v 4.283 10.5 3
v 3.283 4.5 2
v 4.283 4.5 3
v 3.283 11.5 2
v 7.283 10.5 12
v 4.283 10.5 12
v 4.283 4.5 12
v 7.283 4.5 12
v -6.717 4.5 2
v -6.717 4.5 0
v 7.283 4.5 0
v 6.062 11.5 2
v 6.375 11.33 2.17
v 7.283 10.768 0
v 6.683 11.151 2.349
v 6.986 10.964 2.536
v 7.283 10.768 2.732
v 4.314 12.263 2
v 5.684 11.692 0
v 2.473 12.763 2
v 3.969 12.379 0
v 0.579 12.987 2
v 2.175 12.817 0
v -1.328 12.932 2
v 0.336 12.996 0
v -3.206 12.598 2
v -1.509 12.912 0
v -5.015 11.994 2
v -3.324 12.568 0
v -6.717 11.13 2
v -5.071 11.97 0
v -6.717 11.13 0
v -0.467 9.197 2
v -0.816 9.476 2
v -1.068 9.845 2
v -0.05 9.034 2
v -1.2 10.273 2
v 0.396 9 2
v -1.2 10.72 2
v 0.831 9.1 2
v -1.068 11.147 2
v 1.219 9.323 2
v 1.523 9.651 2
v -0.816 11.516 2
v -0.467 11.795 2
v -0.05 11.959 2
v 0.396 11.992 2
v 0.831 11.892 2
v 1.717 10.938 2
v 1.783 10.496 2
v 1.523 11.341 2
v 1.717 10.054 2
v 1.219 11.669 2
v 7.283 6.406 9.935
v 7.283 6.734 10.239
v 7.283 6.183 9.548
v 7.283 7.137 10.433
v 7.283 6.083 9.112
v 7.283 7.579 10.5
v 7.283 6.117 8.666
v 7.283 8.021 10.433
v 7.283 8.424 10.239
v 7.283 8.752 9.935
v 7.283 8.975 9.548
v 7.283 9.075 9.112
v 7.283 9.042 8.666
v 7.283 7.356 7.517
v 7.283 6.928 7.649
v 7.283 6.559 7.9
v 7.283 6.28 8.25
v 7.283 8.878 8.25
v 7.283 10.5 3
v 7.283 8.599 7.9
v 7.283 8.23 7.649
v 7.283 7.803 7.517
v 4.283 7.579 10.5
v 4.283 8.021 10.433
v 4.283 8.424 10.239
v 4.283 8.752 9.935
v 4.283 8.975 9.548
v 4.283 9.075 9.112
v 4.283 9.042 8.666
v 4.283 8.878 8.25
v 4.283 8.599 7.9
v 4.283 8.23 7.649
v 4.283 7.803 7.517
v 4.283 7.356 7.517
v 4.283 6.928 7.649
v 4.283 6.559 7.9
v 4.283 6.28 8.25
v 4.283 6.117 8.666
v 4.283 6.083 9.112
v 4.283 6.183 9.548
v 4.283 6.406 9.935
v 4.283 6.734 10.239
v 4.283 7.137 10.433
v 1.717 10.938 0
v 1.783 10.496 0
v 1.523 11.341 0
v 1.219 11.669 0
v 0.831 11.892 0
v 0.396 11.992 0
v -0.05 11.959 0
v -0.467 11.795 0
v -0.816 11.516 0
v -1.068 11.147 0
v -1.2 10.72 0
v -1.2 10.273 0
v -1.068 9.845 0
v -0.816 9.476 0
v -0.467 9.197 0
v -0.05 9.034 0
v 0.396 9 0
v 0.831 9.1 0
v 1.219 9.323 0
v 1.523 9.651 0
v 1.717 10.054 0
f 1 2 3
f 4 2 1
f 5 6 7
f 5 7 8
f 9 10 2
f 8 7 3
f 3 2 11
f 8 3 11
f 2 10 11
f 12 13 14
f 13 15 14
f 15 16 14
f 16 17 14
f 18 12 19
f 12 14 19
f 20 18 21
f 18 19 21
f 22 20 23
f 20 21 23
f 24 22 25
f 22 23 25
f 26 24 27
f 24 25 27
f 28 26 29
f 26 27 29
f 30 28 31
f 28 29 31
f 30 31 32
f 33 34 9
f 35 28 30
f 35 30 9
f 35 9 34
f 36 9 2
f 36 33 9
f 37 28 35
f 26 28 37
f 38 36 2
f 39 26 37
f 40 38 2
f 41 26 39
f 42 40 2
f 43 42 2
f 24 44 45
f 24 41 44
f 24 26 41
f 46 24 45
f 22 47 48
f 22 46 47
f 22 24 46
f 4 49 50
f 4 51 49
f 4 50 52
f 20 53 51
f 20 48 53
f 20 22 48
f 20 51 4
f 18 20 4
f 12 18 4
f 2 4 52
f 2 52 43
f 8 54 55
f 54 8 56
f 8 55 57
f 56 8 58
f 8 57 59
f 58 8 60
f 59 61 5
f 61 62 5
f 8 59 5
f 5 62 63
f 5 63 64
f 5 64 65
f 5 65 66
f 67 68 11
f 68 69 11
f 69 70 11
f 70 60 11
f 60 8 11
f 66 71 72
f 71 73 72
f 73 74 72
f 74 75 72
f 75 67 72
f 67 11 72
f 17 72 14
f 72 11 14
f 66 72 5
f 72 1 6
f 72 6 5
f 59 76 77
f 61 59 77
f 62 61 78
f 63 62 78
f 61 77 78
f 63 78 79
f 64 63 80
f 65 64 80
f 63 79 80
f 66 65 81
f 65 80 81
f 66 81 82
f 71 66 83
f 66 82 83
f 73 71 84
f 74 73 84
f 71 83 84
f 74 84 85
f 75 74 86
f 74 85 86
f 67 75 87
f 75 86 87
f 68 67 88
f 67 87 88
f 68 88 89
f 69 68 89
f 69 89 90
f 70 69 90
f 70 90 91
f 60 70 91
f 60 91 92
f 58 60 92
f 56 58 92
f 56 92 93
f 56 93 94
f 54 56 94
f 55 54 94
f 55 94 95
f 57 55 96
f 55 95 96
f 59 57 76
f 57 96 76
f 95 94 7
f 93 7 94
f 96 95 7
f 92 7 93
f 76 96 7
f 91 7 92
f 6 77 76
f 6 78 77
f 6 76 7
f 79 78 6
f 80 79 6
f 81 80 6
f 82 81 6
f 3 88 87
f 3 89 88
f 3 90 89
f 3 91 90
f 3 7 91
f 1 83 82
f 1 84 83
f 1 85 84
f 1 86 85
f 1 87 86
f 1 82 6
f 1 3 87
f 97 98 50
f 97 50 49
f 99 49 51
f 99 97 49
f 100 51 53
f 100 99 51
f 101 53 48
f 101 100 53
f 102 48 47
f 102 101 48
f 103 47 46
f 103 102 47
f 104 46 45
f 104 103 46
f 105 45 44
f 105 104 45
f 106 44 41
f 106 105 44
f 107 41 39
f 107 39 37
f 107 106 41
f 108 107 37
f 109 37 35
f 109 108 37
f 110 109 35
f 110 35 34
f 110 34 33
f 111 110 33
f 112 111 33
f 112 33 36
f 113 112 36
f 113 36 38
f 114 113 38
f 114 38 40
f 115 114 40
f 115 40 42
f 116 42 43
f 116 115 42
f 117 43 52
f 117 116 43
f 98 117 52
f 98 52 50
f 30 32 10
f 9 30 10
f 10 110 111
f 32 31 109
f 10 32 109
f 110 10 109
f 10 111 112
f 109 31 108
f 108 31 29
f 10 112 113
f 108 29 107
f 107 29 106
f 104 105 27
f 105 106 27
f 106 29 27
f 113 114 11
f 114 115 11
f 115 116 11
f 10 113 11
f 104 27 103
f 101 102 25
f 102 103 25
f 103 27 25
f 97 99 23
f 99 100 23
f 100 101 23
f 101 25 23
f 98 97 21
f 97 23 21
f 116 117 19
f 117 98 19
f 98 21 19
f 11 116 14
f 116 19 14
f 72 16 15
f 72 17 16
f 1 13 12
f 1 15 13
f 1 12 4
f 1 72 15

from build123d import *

# Parameters (mm, degrees)
SZKIC1_R                    = 1.5
DODANIE_WYCI_GNI_CIE1_DEPTH = 2
SZKIC2_W                    = 3
SZKIC2_H                    = 6
DODANIE_WYCI_GNI_CIE2_DEPTH = 10
SZKIC3_R                    = 1.5
WYTNIJ_WYCI_GNI_CIE1_DEPTH  = 3
SFAZOWANIE1_SIZE            = 1
SFAZOWANIE2_SIZE            = 1


with BuildPart() as part:
    # Szkic1 → Dodanie-wyciągnięcie1 (new body)
    with BuildSketch(Plane.XY):
        with BuildLine():
            Line((-6.716548808, 4.5), (7.283451192, 4.5))
            Line((7.283451192, 4.5), (7.283451192, 10.768070335))
            ThreePointArc((7.283451192, 10.768070335), (0.336426694, 12.995646082), (-6.716548808, 11.130497388))
            Line((-6.716548808, 11.130497388), (-6.716548808, 4.5))
        make_face()
        with Locations((0.283451192, 10.49617337)):
            Circle(SZKIC1_R, mode=Mode.SUBTRACT)
    extrude(amount=DODANIE_WYCI_GNI_CIE1_DEPTH)

    # Szkic2 → Dodanie-wyciągnięcie2 (add)
    with BuildSketch(Plane.XY.offset(2)):
        with Locations((5.783451192, 7.5)):
            Rectangle(SZKIC2_W, SZKIC2_H)
    extrude(amount=DODANIE_WYCI_GNI_CIE2_DEPTH)

    # Szkic3 → Wytnij-wyciągnięcie1 (cut)
    with BuildSketch(Plane.ZY.offset(-4.283451192)):
        with Locations((9, 7.579153313)):
            Circle(SZKIC3_R)
    extrude(amount=-WYTNIJ_WYCI_GNI_CIE1_DEPTH, mode=Mode.SUBTRACT)

    # Sfazowanie1
    sfazowanie1_edges = [part.edges().sort_by_distance(p)[0] for p in [
        (4.283451192, 7.5, 2),
    ]]
    chamfer(sfazowanie1_edges, length=SFAZOWANIE1_SIZE)

    # Sfazowanie2
    sfazowanie2_edges = [part.edges().sort_by_distance(p)[0] for p in [
        (5.283451192, 10.5, 2),
    ]]
    chamfer(sfazowanie2_edges, length=SFAZOWANIE2_SIZE)


solid = part.part
